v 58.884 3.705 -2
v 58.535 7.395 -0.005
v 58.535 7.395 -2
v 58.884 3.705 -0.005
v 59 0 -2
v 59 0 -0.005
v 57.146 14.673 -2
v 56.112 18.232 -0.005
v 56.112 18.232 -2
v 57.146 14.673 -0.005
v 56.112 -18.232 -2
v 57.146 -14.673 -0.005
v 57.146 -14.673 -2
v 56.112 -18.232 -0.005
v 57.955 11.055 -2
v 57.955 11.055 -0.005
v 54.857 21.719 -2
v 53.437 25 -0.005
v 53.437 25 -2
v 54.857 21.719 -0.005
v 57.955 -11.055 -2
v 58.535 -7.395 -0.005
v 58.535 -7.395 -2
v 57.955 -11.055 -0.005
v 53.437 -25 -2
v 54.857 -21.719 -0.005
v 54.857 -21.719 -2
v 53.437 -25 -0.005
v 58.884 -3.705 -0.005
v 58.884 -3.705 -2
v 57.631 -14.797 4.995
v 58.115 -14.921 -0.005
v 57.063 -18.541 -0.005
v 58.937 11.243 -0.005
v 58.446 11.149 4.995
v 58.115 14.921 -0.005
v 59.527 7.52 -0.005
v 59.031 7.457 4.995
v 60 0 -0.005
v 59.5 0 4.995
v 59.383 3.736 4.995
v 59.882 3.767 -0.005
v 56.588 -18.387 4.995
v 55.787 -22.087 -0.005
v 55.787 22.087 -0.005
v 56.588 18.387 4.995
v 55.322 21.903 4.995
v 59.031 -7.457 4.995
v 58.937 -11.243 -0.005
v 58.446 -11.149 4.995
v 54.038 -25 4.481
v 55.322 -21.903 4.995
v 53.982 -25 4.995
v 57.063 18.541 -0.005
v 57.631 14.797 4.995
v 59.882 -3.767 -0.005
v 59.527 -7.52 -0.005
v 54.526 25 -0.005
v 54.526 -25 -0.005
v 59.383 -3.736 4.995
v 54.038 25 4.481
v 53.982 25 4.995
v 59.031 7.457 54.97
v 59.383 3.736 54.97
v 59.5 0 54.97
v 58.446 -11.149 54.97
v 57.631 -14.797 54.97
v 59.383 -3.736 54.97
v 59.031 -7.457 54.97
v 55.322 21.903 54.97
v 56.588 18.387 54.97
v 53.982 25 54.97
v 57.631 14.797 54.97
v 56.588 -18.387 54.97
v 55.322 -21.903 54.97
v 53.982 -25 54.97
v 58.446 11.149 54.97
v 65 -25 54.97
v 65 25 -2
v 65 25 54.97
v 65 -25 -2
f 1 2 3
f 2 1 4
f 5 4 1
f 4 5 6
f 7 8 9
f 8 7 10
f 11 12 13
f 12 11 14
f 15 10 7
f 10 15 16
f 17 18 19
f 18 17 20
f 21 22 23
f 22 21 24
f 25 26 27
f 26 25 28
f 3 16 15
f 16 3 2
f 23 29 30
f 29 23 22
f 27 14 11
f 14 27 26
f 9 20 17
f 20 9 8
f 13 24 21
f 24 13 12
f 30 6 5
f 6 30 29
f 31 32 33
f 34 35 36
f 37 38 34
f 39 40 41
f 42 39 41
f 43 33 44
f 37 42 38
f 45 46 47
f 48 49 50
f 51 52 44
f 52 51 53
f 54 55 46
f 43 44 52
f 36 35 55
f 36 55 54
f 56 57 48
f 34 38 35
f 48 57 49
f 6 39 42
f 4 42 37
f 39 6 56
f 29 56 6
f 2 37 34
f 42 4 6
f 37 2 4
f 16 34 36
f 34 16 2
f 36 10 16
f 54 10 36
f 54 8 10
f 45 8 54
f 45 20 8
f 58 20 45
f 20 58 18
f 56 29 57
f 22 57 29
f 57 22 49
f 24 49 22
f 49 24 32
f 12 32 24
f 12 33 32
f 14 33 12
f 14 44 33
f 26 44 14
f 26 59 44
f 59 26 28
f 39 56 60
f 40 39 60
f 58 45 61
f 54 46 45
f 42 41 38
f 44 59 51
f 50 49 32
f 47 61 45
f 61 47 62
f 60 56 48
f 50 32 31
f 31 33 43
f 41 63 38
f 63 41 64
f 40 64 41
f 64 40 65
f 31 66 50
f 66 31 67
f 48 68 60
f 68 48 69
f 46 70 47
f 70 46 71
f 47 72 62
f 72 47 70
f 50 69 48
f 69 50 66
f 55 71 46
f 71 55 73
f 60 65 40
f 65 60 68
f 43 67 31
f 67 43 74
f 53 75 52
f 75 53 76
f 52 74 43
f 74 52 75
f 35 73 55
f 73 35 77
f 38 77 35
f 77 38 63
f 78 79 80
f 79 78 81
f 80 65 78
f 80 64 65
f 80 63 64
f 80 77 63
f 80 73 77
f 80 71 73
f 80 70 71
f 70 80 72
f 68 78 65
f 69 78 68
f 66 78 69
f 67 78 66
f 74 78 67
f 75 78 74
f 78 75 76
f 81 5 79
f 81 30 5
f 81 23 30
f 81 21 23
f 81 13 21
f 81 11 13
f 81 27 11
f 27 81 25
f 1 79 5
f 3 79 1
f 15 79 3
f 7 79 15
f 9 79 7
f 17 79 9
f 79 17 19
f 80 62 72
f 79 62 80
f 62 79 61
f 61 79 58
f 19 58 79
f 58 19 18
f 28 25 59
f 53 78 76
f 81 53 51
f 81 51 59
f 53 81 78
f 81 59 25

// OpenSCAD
e=.01;

canister1 = [2,126,1,50,120];
canister2 = [0,120,5,50,119];
$fn=100;


module negative(can) {
    l1=can[0]; d1=can[1]; s=can[2]; l2=can[3]; d2=can[4];
    d0 = d1 - 2;
    union(){
        translate([0,0,(-l2+e)/2]) cylinder(h=l2, d1=d0, d2=d0, center=true);
        cylinder(h=l1, d1=d1, d2=d1, center=true);
        translate([0,0,(l1+s-e)/2]) cylinder(h=s, d1=d1, d2=d2, center=true);
        translate([0,0,l1+s+(l2-2*e)/2]) cylinder(h=l2, d1=d2, d2=d2, center=true);
    }
}

module hanger(can){
    l1=can[0]; d1=can[1]; s=can[2]; l2=can[3]; d2=can[4];
    sum=l1+s+l2+2-3*e;
    echo(sum);
    difference(){
        translate([d1/2-5,0, sum/2-2])
        cube([20,50,sum],center=true);
        negative(can);
    }
}

hanger(canister2);
